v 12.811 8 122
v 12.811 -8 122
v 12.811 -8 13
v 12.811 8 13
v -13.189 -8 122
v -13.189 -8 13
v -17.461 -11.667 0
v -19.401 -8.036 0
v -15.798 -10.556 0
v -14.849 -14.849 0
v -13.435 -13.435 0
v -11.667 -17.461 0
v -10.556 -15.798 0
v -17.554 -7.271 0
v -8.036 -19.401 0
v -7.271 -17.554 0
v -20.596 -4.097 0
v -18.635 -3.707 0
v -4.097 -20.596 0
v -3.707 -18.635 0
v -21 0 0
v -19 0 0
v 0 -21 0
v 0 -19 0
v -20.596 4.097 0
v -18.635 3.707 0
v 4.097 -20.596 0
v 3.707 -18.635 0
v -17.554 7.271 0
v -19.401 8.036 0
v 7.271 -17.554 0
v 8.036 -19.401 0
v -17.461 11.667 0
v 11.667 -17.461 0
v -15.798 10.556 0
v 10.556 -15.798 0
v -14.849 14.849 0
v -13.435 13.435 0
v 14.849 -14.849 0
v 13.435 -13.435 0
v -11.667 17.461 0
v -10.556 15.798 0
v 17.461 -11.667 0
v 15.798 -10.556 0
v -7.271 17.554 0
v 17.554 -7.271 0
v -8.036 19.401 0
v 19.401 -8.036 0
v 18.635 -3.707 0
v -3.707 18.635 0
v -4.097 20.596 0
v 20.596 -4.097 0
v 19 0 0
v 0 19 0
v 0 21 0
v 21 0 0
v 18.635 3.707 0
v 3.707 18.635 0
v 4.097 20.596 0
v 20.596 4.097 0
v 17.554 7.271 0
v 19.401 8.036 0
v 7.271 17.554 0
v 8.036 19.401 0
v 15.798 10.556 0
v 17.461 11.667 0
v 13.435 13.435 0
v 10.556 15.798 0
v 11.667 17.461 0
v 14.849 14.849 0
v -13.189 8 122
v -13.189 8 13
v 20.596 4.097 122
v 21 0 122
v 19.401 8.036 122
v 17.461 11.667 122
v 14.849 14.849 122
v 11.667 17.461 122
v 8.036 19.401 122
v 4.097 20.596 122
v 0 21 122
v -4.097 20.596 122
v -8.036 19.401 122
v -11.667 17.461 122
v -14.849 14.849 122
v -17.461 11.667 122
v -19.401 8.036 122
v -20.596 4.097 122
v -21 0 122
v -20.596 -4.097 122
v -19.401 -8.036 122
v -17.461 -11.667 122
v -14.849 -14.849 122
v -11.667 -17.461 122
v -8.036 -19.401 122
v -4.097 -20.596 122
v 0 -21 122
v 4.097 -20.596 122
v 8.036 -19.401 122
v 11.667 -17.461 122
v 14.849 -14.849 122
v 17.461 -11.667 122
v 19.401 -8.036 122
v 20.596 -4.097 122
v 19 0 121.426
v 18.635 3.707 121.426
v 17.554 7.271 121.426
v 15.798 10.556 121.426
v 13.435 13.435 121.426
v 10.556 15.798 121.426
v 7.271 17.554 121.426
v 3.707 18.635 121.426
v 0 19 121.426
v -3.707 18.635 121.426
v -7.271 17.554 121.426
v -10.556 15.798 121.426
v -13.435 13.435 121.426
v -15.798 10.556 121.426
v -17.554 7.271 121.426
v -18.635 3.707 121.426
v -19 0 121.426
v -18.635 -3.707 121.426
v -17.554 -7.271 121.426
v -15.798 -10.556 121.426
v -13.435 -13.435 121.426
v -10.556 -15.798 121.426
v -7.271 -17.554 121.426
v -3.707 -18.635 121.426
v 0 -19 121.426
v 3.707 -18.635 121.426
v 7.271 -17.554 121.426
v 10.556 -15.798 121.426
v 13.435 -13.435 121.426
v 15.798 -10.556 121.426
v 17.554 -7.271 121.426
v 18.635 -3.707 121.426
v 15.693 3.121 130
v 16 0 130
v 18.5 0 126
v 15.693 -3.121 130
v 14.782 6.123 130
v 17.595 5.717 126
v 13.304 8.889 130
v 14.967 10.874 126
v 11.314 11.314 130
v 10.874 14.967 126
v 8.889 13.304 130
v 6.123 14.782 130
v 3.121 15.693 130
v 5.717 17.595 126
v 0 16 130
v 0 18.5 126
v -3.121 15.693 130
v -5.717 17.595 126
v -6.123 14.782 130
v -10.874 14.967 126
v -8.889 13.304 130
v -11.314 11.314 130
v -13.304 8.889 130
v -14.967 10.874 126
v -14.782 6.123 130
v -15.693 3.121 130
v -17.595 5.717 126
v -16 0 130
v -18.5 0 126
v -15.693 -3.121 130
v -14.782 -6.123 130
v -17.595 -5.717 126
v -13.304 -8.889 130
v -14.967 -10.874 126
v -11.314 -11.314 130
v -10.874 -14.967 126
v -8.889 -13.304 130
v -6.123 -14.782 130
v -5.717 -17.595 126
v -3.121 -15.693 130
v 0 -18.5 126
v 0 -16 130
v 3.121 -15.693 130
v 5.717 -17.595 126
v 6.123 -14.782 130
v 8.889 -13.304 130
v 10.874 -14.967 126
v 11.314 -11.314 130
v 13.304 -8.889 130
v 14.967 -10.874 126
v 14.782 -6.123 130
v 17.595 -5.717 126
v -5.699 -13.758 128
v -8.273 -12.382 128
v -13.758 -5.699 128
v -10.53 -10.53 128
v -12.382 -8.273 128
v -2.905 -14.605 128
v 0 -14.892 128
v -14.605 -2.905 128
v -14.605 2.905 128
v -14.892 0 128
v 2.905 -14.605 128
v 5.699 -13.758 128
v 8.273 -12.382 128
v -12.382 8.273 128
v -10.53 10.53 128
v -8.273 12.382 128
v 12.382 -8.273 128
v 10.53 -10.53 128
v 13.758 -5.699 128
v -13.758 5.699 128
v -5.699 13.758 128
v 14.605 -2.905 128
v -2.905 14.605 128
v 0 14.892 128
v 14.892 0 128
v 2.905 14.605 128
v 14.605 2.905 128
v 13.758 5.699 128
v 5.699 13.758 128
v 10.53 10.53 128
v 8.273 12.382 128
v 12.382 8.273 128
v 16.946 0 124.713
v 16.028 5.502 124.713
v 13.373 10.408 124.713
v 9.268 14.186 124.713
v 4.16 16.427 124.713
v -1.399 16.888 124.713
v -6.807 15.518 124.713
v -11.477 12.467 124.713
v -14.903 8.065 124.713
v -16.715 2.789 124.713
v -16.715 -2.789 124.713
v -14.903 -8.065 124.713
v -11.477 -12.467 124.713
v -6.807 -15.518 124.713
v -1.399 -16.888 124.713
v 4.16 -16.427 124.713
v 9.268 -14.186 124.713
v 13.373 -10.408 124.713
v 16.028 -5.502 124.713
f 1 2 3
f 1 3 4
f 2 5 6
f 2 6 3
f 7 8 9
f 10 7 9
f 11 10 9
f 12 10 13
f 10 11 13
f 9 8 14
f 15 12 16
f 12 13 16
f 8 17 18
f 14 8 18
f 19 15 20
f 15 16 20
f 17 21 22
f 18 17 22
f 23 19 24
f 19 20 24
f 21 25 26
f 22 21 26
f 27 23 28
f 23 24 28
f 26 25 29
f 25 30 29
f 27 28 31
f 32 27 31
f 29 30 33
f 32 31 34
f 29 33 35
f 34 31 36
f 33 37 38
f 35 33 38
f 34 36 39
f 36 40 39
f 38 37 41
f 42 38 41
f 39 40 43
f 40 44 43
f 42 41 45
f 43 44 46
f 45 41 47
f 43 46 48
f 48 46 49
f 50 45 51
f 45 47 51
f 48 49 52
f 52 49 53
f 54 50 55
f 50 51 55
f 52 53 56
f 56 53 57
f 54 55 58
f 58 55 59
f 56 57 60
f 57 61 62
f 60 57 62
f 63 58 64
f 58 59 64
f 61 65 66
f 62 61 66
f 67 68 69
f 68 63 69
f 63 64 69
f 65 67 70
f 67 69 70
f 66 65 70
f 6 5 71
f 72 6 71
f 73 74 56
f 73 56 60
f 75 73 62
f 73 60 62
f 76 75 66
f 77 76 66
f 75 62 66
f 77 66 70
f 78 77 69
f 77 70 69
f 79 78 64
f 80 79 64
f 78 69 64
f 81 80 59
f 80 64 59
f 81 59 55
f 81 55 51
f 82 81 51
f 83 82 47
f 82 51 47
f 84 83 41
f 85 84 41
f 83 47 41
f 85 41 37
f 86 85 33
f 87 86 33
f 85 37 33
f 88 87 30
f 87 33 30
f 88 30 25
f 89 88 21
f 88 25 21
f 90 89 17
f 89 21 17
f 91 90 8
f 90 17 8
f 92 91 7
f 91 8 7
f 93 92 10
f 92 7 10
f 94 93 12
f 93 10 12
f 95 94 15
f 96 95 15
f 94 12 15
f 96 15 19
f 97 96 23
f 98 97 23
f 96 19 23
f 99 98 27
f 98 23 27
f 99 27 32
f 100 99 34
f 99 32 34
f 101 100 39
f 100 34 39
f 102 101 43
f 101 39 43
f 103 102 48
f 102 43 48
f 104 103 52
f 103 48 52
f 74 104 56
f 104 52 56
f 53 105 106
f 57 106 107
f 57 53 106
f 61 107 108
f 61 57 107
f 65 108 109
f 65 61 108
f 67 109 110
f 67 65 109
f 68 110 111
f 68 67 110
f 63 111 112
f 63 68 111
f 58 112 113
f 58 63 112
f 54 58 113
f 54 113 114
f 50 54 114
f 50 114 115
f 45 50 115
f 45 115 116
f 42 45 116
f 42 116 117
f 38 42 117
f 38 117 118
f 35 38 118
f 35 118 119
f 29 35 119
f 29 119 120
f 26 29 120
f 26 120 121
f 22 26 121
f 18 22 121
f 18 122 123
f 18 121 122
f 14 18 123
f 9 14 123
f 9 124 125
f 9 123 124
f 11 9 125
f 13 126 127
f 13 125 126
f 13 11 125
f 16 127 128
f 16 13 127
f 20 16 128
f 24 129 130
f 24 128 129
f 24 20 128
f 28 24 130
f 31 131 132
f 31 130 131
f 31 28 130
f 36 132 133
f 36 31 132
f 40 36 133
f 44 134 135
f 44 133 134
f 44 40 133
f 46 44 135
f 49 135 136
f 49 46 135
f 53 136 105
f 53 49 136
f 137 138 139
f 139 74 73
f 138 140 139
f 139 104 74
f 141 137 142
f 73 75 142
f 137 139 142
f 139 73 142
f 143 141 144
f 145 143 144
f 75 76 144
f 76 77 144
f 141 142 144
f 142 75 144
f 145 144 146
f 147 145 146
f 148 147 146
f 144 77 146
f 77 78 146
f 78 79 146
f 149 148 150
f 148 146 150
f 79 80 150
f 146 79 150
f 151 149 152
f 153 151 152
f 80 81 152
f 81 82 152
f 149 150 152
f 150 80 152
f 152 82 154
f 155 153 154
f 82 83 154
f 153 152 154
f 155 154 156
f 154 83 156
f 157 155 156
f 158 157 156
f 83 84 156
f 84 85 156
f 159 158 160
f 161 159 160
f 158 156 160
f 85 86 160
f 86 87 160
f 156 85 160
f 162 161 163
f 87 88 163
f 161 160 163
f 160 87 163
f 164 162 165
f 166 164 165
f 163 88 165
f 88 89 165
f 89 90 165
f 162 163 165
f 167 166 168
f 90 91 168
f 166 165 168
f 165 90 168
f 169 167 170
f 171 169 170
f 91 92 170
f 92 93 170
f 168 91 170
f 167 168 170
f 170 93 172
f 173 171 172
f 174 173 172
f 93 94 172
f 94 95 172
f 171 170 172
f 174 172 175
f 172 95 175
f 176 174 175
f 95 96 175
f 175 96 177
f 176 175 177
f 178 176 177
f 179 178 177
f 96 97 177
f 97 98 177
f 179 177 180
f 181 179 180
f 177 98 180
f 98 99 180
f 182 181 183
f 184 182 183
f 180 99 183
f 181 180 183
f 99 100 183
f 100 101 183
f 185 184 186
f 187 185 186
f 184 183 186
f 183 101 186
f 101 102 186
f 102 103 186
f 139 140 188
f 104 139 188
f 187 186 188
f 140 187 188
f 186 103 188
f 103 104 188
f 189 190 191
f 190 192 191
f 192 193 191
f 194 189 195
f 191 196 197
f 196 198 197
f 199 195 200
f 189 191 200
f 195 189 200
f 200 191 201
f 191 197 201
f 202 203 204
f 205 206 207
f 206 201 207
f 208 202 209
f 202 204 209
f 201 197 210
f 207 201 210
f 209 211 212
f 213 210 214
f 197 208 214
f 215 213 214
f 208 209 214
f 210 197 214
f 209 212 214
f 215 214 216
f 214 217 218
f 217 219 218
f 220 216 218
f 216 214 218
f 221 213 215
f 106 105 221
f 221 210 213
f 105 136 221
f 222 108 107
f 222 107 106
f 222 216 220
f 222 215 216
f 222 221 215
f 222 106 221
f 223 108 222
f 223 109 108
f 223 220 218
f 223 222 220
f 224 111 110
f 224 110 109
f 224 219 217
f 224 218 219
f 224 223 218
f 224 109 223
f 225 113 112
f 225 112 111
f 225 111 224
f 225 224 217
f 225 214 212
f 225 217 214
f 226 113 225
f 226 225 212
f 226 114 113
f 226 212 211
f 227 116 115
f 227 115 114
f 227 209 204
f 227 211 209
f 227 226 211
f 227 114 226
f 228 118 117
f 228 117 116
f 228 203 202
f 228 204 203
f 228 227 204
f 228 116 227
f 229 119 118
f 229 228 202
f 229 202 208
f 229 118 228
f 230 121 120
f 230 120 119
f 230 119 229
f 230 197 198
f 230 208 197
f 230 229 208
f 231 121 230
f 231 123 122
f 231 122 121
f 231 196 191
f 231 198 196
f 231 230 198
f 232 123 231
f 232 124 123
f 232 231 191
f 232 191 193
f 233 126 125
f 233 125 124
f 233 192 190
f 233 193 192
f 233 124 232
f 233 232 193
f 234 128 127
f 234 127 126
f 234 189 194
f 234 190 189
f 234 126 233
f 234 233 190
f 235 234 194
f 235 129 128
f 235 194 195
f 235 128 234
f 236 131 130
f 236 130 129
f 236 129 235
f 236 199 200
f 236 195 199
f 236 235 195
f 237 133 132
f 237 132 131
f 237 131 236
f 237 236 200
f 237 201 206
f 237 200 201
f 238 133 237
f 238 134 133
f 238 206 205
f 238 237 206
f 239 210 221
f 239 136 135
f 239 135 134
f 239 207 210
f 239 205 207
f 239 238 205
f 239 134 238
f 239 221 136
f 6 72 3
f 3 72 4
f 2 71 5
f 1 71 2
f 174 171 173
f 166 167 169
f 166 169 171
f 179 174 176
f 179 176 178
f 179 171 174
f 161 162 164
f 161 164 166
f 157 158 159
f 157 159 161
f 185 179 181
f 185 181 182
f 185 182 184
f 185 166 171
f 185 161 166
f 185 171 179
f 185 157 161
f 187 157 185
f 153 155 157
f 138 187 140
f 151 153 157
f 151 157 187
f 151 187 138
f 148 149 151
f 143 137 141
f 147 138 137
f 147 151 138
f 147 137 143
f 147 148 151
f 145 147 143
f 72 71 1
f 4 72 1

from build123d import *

# Parameters (mm, degrees)
F0_R     = 21
F1_DEPTH = 130
F2_SIZE2 = 8
F2_SIZE  = 5
F3_T     = -2
F5_W     = 26
F5_H     = 16
F6_DEPTH = 109


with BuildPart() as f1:
    # F0 (on Top) → F1 (new body)
    with BuildSketch(Plane.XY):
        Circle(F0_R)
    extrude(amount=F1_DEPTH)

    # F2
    f2_edges = [f1.edges().sort_by_distance(p)[0] for p in [
        (-21, 0, 130),
    ]]
    f2_side = f1.faces().sort_by_distance((0, 0, 130))[0]
    chamfer(f2_edges, length=F2_SIZE, length2=F2_SIZE2, reference=f2_side)

    # F3
    f3_openings = [f1.faces().sort_by_distance(p)[0] for p in [
        (0, 0, 0),
    ]]
    offset(amount=F3_T, openings=f3_openings)


with BuildPart() as f6:
    # F5 (on offset) → F6 (new body)
    with BuildSketch(Plane.XY.offset(122)):
        with Locations((-0.188622158, 0)):
            Rectangle(F5_W, F5_H)
    extrude(amount=-F6_DEPTH)


solid = Compound([f1.part, f6.part])
